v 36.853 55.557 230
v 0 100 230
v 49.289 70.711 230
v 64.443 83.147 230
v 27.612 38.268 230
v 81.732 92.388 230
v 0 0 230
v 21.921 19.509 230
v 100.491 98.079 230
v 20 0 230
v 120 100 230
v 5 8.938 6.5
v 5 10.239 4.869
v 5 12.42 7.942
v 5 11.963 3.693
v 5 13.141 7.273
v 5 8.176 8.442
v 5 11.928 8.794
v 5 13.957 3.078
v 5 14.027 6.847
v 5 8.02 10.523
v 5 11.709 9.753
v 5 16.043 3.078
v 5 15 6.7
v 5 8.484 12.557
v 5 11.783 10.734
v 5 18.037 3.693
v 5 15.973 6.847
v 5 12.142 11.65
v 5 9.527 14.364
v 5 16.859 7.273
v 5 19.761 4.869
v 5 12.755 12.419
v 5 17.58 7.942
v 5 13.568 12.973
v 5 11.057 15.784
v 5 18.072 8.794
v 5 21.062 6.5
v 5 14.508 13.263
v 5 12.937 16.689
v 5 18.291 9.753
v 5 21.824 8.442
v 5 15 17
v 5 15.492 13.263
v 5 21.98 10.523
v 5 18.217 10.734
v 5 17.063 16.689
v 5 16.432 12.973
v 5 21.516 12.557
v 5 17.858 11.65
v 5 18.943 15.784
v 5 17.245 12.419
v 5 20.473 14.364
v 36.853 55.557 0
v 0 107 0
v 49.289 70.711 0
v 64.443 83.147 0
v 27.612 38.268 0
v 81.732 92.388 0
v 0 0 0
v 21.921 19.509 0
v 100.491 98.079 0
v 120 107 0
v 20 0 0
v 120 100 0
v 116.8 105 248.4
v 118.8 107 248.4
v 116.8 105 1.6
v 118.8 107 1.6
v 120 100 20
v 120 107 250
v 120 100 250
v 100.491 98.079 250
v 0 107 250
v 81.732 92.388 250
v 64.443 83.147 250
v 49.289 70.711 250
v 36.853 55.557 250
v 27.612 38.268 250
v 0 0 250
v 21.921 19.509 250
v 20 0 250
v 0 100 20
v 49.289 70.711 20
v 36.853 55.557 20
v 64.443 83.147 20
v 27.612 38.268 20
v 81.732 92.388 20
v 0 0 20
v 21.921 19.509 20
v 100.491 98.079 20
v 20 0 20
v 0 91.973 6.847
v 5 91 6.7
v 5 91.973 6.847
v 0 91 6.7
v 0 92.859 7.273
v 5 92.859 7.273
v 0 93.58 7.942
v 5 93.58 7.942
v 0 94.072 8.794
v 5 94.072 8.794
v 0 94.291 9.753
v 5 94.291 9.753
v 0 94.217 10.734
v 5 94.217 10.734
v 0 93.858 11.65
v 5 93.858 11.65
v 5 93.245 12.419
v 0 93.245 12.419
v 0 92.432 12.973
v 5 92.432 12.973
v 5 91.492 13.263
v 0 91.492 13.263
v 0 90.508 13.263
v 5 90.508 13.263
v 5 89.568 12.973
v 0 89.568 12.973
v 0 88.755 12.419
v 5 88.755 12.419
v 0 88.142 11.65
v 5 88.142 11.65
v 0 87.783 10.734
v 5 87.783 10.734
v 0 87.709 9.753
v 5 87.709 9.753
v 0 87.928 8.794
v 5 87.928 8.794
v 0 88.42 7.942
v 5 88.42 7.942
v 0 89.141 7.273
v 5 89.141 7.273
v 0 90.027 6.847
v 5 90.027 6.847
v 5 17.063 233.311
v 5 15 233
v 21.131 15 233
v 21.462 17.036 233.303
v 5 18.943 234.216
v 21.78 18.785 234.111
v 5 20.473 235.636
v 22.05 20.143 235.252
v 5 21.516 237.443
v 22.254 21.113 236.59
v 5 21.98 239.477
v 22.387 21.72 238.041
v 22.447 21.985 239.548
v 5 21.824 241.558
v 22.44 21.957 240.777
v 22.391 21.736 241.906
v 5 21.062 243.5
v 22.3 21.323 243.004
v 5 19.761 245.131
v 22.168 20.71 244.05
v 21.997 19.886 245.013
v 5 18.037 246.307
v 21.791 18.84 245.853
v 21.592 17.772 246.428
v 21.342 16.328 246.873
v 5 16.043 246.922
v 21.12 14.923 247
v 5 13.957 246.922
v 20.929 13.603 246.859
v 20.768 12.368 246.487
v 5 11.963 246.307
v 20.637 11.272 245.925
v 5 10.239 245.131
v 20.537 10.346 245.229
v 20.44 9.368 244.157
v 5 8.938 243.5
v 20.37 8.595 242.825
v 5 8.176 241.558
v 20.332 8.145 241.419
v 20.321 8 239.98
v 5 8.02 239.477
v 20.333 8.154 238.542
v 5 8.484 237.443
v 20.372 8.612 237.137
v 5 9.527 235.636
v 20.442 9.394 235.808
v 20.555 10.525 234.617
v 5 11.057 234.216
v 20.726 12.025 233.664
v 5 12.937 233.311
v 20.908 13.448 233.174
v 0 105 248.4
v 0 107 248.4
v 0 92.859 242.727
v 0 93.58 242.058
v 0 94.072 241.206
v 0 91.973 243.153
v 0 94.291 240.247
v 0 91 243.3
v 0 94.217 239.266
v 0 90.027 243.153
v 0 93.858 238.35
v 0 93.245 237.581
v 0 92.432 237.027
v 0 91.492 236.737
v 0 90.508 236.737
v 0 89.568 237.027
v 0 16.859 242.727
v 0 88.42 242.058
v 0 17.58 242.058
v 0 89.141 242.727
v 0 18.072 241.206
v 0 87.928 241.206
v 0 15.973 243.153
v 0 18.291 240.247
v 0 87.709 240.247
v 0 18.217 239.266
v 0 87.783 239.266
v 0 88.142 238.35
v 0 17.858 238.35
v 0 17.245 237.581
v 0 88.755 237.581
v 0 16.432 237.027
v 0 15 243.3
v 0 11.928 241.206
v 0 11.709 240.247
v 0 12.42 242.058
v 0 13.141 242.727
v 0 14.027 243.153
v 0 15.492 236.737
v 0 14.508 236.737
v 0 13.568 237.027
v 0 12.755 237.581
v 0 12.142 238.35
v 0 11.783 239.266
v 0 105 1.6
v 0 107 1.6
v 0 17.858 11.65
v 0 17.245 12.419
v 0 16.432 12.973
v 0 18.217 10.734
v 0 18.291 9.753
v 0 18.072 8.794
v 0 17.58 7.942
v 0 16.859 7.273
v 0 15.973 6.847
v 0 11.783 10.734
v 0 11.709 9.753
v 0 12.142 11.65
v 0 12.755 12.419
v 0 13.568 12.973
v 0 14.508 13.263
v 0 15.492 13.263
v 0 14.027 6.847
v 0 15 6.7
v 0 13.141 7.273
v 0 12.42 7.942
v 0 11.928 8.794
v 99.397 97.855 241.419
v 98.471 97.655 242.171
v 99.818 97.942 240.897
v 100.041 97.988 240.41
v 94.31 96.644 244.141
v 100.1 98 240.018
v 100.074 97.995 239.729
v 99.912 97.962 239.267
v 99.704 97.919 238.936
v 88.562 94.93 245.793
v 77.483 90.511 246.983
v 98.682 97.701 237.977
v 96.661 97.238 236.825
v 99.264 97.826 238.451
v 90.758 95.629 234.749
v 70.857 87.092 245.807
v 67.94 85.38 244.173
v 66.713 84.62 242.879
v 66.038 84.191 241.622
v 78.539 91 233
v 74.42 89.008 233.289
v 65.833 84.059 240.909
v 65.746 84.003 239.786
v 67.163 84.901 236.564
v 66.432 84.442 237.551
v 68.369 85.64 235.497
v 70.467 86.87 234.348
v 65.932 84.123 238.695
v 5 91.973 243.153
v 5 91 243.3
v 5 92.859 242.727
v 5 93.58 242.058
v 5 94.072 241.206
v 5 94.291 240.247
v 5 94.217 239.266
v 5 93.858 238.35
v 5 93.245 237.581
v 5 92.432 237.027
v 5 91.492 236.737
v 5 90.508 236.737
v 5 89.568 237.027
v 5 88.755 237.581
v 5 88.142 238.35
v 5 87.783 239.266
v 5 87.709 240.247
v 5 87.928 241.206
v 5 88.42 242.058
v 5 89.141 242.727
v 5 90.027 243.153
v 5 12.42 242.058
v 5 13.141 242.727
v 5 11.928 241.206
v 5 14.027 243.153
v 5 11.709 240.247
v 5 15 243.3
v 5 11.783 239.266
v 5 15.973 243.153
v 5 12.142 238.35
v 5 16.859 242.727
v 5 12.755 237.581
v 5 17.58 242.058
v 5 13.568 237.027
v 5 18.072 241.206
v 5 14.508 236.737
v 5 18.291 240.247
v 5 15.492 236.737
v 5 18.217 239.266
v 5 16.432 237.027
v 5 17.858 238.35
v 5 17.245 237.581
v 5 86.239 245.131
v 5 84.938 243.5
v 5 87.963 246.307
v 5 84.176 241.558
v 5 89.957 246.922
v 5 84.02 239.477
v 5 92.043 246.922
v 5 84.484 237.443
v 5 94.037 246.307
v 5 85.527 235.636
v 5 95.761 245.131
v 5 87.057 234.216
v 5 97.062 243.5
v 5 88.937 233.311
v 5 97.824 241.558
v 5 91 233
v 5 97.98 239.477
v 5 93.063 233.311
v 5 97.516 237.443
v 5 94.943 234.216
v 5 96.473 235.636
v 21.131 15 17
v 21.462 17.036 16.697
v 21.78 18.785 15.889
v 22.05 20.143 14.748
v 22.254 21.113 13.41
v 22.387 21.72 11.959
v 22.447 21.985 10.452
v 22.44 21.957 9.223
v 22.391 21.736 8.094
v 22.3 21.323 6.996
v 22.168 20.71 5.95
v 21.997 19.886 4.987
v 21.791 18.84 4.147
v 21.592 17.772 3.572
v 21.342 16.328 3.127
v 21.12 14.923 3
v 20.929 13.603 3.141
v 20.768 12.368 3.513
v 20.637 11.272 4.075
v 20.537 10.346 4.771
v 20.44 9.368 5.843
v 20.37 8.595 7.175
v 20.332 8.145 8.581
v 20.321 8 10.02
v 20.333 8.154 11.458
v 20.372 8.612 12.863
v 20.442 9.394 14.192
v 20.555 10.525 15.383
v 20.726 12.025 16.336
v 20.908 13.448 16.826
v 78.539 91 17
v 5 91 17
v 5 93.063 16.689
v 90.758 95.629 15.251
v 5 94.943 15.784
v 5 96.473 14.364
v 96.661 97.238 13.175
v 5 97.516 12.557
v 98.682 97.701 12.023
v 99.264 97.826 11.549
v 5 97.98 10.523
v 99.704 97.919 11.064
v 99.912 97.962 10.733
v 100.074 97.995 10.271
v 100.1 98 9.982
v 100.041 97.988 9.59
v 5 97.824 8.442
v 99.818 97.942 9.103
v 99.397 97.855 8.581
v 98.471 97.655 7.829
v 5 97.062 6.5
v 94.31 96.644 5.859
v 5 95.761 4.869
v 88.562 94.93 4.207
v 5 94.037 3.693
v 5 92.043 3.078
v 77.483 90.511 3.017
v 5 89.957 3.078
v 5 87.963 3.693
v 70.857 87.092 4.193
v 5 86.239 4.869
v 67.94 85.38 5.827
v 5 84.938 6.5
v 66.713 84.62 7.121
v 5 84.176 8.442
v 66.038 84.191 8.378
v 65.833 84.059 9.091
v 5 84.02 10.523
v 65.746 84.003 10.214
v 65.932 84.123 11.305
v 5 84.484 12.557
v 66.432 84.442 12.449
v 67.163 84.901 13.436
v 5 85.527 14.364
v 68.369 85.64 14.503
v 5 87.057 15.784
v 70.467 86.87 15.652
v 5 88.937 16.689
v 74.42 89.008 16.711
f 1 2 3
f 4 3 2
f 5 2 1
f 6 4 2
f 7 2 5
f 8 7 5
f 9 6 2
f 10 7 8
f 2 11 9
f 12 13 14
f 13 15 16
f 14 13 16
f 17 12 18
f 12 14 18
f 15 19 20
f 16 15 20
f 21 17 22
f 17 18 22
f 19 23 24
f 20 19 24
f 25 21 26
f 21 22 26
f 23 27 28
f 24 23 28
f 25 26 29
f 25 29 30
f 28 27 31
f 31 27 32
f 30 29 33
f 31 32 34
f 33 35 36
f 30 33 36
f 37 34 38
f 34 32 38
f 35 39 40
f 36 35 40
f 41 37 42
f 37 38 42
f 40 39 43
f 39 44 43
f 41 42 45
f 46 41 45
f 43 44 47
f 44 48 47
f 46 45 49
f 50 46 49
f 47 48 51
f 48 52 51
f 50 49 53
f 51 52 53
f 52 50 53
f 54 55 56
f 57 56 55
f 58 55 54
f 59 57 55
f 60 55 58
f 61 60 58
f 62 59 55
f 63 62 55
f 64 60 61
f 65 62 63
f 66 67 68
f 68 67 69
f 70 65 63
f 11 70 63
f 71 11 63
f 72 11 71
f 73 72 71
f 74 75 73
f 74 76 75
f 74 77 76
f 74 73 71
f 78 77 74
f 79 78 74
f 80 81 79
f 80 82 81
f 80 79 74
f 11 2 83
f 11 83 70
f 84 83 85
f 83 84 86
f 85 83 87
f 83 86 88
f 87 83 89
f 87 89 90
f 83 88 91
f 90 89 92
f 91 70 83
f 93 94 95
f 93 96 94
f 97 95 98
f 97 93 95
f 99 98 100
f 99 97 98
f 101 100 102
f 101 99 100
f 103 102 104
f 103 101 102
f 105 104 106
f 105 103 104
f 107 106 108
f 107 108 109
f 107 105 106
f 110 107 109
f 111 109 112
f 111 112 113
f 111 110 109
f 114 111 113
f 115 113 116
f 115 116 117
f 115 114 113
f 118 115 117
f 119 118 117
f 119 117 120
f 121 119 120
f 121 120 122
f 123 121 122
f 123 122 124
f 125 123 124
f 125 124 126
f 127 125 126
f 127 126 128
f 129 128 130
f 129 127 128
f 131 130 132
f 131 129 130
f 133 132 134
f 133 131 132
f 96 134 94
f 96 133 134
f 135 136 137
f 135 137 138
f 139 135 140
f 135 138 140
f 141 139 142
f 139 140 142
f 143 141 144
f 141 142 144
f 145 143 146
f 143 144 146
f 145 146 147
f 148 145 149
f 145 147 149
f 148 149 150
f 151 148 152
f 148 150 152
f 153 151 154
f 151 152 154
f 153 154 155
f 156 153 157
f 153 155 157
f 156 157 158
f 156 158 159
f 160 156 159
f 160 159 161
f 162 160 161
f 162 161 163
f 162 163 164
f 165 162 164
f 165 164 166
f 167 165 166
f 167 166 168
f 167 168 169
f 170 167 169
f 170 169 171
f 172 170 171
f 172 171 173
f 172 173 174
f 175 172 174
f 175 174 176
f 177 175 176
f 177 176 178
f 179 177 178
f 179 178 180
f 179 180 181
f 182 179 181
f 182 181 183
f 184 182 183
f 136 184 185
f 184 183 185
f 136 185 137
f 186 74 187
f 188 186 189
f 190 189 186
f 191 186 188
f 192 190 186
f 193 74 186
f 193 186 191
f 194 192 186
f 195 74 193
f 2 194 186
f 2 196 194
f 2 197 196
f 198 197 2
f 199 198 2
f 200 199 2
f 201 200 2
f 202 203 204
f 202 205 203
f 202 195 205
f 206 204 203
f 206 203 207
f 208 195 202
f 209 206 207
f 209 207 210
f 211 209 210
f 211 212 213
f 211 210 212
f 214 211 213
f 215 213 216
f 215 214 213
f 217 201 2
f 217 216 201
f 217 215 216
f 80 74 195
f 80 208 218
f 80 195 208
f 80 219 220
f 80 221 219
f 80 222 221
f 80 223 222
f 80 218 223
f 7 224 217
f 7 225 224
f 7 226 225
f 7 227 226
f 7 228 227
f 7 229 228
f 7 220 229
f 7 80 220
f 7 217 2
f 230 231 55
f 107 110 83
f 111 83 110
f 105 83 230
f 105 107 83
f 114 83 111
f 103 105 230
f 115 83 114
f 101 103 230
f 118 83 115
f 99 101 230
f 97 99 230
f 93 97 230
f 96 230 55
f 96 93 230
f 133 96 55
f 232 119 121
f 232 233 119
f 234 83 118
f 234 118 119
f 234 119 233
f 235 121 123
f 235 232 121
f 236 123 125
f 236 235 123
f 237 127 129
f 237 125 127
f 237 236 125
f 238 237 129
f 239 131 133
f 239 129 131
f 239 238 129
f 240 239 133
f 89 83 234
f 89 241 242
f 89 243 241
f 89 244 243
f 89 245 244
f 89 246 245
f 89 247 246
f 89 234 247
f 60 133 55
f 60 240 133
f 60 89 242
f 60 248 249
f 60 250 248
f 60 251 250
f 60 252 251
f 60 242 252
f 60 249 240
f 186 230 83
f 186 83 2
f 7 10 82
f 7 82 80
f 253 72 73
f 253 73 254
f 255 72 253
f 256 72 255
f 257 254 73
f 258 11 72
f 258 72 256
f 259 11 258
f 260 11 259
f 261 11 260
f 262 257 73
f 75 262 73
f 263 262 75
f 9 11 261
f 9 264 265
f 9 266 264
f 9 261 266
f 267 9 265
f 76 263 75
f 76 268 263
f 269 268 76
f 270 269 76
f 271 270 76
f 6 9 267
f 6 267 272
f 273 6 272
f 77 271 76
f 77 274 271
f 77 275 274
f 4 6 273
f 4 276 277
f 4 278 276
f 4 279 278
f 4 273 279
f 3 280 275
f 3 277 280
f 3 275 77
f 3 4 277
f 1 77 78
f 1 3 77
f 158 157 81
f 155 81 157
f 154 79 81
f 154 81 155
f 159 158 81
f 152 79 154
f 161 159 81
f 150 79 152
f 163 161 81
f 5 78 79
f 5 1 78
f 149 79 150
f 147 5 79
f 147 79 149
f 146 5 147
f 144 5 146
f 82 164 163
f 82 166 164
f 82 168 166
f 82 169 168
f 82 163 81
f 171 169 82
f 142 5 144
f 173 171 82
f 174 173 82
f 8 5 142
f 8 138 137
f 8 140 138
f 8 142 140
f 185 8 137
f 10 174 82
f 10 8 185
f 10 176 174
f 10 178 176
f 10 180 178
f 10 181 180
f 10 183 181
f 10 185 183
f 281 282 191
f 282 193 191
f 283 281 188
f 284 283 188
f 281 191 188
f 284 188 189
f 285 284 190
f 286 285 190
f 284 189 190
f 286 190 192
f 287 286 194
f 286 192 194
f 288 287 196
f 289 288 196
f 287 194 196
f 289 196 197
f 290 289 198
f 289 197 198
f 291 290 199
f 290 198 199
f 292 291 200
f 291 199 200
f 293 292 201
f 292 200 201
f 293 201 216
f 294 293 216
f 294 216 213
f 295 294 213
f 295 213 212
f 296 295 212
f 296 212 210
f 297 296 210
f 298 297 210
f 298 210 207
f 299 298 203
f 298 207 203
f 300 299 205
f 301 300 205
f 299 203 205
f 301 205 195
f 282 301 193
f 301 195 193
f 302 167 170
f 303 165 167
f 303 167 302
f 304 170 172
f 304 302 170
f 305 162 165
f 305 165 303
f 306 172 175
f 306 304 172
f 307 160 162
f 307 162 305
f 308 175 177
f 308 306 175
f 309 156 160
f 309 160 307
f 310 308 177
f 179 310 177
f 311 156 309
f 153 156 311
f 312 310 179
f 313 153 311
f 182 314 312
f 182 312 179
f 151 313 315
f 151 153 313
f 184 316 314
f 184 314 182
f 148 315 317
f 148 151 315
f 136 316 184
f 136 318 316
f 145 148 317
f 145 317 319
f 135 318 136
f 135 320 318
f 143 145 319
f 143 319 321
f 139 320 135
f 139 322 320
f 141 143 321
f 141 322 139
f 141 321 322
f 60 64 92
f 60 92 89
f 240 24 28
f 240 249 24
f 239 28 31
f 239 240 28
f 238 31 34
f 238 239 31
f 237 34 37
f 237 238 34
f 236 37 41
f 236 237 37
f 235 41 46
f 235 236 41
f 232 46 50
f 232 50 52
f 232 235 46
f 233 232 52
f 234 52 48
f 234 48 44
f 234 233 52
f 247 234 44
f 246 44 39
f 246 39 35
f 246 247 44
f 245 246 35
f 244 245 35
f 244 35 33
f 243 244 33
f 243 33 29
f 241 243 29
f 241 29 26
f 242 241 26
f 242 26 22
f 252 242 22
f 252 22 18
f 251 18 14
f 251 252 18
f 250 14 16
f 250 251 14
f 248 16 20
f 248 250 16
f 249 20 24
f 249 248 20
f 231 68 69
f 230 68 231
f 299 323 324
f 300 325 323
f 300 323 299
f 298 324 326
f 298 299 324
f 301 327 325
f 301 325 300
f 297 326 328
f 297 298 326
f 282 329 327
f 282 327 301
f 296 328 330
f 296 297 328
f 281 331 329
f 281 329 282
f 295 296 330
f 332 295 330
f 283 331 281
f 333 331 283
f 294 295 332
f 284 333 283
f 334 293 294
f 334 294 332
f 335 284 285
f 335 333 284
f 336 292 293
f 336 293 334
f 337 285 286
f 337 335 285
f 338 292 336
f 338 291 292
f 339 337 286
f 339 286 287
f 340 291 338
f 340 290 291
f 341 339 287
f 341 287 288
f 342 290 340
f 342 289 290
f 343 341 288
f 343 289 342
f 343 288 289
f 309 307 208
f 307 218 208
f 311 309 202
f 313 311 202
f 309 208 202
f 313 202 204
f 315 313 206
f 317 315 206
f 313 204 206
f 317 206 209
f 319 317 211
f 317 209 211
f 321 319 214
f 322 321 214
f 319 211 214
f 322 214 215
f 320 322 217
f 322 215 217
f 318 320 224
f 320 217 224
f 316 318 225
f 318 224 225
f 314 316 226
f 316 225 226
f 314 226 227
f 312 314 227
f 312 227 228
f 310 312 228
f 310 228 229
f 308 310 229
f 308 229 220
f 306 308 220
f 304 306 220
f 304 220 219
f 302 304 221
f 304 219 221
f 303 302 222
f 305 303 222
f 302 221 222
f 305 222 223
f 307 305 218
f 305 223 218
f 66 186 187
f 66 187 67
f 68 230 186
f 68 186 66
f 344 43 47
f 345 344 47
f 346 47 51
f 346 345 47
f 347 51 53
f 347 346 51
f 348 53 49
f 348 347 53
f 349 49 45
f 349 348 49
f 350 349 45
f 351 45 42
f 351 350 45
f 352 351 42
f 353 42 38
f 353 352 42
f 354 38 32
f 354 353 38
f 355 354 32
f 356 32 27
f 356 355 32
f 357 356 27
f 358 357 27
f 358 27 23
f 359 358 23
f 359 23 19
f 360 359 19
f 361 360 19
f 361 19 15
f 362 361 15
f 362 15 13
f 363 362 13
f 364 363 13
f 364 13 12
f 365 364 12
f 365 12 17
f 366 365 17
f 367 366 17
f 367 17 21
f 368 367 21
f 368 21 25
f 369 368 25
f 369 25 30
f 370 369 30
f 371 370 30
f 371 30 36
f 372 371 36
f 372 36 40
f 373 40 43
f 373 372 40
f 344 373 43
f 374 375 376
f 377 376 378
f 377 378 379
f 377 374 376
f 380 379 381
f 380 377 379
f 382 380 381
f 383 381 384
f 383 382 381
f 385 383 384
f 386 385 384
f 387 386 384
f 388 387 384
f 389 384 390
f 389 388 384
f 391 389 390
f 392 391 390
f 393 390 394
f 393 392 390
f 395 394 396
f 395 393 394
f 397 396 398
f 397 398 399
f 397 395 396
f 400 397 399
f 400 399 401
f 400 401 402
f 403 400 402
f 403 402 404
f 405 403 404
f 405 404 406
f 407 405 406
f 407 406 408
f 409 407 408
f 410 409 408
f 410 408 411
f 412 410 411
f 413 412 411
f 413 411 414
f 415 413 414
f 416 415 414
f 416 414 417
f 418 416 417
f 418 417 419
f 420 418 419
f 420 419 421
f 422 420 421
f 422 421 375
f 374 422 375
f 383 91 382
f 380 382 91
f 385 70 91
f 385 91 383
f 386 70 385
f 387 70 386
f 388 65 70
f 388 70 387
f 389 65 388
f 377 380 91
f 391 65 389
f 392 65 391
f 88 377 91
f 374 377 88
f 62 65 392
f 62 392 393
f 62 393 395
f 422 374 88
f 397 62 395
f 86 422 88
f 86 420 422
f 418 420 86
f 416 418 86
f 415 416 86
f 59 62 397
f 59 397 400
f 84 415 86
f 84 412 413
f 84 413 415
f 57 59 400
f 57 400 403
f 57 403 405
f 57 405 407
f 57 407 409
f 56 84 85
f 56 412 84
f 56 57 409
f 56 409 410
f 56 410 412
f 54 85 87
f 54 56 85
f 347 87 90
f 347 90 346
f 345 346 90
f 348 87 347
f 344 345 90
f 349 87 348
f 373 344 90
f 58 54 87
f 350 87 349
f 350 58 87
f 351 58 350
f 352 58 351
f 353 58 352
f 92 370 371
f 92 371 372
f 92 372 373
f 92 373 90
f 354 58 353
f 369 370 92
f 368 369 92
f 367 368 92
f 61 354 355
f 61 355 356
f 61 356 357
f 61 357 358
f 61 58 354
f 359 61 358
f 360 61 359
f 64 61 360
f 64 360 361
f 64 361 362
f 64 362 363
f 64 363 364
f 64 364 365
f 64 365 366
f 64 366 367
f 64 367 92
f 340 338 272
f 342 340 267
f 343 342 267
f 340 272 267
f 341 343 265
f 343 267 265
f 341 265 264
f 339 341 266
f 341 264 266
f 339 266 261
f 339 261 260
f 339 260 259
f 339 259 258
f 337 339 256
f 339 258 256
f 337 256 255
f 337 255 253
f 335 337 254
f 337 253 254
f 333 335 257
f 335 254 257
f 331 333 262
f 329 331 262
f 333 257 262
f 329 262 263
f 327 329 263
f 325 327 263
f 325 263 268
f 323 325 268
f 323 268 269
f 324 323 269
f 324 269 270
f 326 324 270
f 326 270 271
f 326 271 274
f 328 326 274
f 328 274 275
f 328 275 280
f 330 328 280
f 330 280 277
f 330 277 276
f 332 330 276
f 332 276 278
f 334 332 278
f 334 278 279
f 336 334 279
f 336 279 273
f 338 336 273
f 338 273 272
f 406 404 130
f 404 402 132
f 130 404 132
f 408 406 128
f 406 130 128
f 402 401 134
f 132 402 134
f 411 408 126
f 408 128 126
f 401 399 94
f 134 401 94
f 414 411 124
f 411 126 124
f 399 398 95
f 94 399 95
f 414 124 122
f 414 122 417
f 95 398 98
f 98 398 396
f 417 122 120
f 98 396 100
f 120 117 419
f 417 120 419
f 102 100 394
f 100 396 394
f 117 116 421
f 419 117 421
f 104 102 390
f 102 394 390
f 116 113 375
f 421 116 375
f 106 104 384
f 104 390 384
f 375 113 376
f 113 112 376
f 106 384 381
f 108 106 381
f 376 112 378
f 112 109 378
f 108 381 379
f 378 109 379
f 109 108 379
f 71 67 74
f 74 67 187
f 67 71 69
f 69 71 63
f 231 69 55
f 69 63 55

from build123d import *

# Parameters (mm, degrees)
P_IDAT_VYSUNUT_M1_DEPTH                           = 250
SKICA2_W                                          = 120
SKICA2_H                                          = 210
ODEBRAT_VYSUNUT_M1_DEPTH                          = 100
V_LCOV_ZAHLOUBEN_PRO_M6_ROUBY_S_V_LCO_D           = 6.6
V_LCOV_ZAHLOUBEN_PRO_M6_ROUBY_S_V_LCO_CBORE_D     = 14
V_LCOV_ZAHLOUBEN_PRO_M6_ROUBY_S_V_LCO_CBORE_DEPTH = 115
P_IDAT_VYSUNUT_M2_DEPTH                           = 2
ZKOSEN_1_SIZE                                     = 2


with BuildPart() as part:
    # Skica1 → Přidat vysunutím1 (new body)
    with BuildSketch(Plane.XY):
        with BuildLine():
            Line((0, 0), (0, 105))
            Line((0, 105), (120, 105))
            Line((120, 105), (120, 100))
            ThreePointArc((120, 100), (49.289321881, 70.710678119), (20, 0))
            Line((20, 0), (0, 0))
        make_face()
    extrude(amount=P_IDAT_VYSUNUT_M1_DEPTH)

    # Skica2 → Odebrat vysunutím1 (cut)
    with BuildSketch(Plane.XZ):
        with Locations((60, 125)):
            Rectangle(SKICA2_W, SKICA2_H)
    extrude(amount=-ODEBRAT_VYSUNUT_M1_DEPTH, mode=Mode.SUBTRACT)

    # Válcové zahloubení pro M6 šrouby s válcovou hlavou zaoblenou1 (through all)
    with Locations(Plane(origin=(120, 0, 0), x_dir=(0, 0, -1), z_dir=(1, 0, 0))):
        with Locations((-240, 91), (-240, 15)):
            v_lcov_zahlouben_pro_m6_rouby_s_v_lco = CounterBoreHole(V_LCOV_ZAHLOUBEN_PRO_M6_ROUBY_S_V_LCO_D / 2, V_LCOV_ZAHLOUBEN_PRO_M6_ROUBY_S_V_LCO_CBORE_D / 2, V_LCOV_ZAHLOUBEN_PRO_M6_ROUBY_S_V_LCO_CBORE_DEPTH)

    # Zrcadlit1: Válcové zahloubení pro M6 šrouby s válcovou hlavou zaoblenou1 across plane
    add(v_lcov_zahlouben_pro_m6_rouby_s_v_lco.mirror(Plane.XY.offset(125)), mode=Mode.SUBTRACT)

    # Skica8 → Přidat vysunutím2 (add)
    with BuildSketch(Plane(origin=(0, 105, 0), x_dir=(1, 0, 0), z_dir=(0, 1, 0))):
        Polygon((0, 0), (120, 0), (120, -250), (0, -250), (0, -248.4), (116.8, -248.4), (116.8, -1.6), (0, -1.6), align=None)
    extrude(amount=P_IDAT_VYSUNUT_M2_DEPTH)

    # Zkosení1
    zkosen_1_edges = [part.edges().sort_by_distance(p)[0] for p in [
        (116.8, 107, 125),
    ]]
    chamfer(zkosen_1_edges, length=ZKOSEN_1_SIZE - 0.0001)  # a hair under: the kernel refuses the full size


solid = part.part
